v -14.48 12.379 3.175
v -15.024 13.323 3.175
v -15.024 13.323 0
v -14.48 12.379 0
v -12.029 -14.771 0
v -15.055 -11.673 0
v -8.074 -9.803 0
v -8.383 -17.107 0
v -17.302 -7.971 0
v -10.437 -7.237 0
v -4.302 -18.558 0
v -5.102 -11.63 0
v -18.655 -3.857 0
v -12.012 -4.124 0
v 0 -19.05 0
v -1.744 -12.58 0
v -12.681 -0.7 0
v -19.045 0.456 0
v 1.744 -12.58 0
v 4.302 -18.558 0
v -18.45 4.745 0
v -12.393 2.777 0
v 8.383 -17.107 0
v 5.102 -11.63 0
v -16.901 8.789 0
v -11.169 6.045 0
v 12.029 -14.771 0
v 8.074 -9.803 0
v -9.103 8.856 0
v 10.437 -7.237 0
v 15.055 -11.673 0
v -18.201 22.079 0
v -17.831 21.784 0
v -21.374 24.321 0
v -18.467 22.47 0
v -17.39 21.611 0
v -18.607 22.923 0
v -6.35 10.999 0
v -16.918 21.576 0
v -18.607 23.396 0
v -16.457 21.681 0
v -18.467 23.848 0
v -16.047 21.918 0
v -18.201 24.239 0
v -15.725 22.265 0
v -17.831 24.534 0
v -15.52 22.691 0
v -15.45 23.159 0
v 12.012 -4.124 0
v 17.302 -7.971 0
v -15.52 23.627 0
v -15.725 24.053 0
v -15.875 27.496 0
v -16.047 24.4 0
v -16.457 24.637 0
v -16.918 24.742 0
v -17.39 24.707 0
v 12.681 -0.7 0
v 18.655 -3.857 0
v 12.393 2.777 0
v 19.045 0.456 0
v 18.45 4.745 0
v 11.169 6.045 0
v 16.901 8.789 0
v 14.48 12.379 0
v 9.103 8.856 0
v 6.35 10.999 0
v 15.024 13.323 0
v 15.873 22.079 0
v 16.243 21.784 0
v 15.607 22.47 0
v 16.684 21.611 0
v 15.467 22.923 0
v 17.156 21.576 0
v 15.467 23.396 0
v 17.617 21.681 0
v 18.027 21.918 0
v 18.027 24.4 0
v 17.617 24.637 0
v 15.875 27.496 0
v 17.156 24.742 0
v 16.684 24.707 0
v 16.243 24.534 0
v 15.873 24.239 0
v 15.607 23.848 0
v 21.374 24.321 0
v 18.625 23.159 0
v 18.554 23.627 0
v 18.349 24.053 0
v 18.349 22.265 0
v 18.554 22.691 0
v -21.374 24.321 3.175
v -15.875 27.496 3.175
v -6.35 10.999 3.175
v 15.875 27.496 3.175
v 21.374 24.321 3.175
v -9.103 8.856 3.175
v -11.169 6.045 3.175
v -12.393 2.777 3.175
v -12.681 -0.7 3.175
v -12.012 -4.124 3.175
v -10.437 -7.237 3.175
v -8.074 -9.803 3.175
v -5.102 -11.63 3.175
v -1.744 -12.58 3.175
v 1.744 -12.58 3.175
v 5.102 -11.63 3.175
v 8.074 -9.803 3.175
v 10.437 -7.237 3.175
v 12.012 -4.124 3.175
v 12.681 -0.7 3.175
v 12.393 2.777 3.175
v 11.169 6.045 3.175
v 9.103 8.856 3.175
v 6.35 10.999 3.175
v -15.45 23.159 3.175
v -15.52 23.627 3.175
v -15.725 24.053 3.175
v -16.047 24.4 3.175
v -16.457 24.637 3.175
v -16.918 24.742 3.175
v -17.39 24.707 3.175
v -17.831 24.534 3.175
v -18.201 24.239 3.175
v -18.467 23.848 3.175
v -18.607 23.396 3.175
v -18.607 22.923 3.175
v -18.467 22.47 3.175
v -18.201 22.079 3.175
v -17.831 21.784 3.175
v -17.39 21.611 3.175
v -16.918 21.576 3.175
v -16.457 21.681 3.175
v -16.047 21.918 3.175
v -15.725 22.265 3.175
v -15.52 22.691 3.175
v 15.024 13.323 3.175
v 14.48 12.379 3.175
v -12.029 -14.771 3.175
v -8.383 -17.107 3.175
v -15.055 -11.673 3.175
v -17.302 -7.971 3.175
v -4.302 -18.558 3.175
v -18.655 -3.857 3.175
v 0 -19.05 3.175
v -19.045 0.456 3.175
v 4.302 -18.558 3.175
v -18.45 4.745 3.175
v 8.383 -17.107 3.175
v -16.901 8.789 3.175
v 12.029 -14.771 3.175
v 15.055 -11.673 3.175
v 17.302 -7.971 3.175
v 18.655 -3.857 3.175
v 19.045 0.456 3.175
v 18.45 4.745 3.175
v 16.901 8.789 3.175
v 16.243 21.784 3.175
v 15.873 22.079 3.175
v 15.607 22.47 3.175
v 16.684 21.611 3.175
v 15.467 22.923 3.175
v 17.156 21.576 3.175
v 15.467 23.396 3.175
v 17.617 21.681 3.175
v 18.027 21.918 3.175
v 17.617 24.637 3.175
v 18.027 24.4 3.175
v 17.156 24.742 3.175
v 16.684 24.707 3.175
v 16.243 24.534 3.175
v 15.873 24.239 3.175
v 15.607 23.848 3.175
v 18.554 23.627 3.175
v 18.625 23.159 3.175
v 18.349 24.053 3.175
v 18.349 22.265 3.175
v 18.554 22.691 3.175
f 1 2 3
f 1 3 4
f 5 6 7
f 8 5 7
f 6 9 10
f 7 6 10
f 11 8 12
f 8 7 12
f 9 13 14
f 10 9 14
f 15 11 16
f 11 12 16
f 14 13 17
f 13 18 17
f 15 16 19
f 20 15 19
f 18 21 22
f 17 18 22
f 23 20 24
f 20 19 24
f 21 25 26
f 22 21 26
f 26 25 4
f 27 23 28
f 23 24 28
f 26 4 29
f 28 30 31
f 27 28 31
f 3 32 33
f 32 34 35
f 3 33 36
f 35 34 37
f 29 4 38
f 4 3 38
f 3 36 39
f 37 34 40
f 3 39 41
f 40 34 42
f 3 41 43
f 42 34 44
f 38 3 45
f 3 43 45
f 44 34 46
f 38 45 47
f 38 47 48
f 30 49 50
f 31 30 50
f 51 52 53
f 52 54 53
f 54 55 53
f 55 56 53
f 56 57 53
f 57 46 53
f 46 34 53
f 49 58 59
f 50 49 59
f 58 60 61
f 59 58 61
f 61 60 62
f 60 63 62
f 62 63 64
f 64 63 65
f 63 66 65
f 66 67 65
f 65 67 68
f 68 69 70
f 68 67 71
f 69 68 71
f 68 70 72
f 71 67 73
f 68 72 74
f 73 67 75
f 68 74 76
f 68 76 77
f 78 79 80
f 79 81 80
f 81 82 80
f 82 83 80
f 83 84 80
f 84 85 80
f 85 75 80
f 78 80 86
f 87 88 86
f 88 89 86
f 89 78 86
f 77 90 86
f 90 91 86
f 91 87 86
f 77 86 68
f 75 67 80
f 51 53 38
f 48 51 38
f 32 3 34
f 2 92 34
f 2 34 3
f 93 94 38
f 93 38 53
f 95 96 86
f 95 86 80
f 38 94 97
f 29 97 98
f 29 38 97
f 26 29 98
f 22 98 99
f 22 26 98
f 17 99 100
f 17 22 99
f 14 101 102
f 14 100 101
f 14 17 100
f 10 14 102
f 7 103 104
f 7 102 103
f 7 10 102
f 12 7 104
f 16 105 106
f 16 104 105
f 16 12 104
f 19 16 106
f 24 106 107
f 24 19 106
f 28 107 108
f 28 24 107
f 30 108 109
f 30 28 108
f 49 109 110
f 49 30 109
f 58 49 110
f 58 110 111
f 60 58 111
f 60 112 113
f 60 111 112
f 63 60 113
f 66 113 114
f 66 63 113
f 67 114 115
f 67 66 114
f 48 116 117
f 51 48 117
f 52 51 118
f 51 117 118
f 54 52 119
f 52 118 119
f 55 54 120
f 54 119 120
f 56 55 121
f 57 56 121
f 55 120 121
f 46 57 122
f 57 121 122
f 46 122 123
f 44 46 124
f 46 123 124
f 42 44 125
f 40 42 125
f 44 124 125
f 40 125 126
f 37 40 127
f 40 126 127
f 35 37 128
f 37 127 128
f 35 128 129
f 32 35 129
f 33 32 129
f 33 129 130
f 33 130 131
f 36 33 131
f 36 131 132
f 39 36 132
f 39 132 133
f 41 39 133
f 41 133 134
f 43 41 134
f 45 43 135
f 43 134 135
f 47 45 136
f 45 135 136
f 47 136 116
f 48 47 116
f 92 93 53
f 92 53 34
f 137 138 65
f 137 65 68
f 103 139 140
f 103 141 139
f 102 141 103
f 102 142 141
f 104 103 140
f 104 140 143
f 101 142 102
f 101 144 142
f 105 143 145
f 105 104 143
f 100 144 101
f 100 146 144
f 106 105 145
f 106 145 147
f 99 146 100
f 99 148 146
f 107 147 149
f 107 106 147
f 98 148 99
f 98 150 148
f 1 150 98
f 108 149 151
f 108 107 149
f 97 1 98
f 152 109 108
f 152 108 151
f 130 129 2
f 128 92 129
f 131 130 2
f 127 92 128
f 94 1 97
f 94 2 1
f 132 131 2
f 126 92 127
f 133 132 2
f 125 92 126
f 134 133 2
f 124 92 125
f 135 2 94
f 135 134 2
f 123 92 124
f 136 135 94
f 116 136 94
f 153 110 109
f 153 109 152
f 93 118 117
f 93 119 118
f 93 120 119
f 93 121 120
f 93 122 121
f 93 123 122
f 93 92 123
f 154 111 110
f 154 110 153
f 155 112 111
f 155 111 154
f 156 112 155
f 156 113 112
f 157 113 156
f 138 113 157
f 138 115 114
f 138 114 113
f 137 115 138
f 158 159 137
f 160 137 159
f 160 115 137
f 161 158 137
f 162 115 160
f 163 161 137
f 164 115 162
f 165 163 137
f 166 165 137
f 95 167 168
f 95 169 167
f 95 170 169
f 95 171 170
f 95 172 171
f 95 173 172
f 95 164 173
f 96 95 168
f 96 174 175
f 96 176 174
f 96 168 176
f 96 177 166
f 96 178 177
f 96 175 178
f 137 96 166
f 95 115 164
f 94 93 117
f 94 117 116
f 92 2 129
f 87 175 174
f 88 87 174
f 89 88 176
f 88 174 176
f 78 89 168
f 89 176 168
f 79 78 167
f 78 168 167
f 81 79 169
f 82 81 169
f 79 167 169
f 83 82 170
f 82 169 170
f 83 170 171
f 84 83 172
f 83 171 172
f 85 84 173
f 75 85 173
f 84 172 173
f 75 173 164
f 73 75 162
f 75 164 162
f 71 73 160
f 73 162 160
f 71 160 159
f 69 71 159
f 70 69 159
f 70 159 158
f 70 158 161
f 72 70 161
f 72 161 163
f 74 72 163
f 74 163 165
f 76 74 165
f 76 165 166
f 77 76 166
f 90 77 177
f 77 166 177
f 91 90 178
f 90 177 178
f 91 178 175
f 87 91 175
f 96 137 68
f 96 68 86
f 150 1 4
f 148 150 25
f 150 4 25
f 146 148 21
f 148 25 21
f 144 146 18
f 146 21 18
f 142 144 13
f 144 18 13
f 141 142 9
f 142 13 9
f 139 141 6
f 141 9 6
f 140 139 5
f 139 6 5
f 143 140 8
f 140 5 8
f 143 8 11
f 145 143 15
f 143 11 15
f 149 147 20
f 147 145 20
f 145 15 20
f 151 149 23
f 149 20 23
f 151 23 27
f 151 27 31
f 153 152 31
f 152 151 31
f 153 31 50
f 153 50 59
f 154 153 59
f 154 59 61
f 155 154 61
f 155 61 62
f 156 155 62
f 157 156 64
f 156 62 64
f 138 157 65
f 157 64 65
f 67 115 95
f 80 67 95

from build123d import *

# Parameters (mm, degrees)
SKETCH2_R           = 19.05
SKETCH2_R_2         = 15.875
SKETCH2_R_3         = 12.7
BOSS_EXTRUDE1_DEPTH = 3.175
SKETCH3_R           = 1.5875
BOSS_EXTRUDE2_DEPTH = 3.175
CUT_EXTRUDE1_DEPTH  = 3.175


with BuildPart() as part:
    # Sketch2 → Boss-Extrude1 (new body)
    with BuildSketch(Plane.XY):
        Circle(SKETCH2_R)
        Circle(SKETCH2_R_2, mode=Mode.SUBTRACT)
        Circle(SKETCH2_R_2)
        Circle(SKETCH2_R_3, mode=Mode.SUBTRACT)
    extrude(amount=BOSS_EXTRUDE1_DEPTH)

    # Sketch3 → Boss-Extrude2 (add)
    with BuildSketch(Plane.XY.offset(3.175)):
        with BuildLine():
            ThreePointArc((-14.479517435, 12.379259867), (-12.17763419, 14.649495743), (-9.525, 16.497783942))
            Line((-9.525, 16.497783942), (-15.875, 27.49630657))
            Line((-15.875, 27.49630657), (-21.374261314, 24.32130657))
            Line((-21.374261314, 24.32130657), (-15.024261314, 13.322783942))
            Line((-15.024261314, 13.322783942), (-14.479517435, 12.379259867))
        make_face()
        with Locations((-17.037130657, 23.159175913)):
            Circle(SKETCH3_R, mode=Mode.SUBTRACT)
        with BuildLine():
            Line((15.875, 27.49630657), (9.525, 16.497783942))
            ThreePointArc((9.525, 16.497783942), (12.17763419, 14.649495743), (14.479517435, 12.379259867))
            Line((14.479517435, 12.379259867), (15.024261314, 13.322783942))
            Line((15.024261314, 13.322783942), (21.374261314, 24.32130657))
            Line((21.374261314, 24.32130657), (15.875, 27.49630657))
        make_face()
        with Locations((17.037130657, 23.159175913)):
            Circle(SKETCH3_R, mode=Mode.SUBTRACT)
    extrude(amount=-BOSS_EXTRUDE2_DEPTH)

    # Sketch5 → Cut-Extrude1 (cut)
    with BuildSketch(Plane.XY.offset(3.175)):
        with BuildLine():
            Line((-9.525, 16.497783942), (0, 0))
            Line((0, 0), (9.525, 16.497783942))
            ThreePointArc((9.525, 16.497783942), (0, 19.05), (-9.525, 16.497783942))
        make_face()
    extrude(amount=-CUT_EXTRUDE1_DEPTH, mode=Mode.SUBTRACT)


solid = part.part
